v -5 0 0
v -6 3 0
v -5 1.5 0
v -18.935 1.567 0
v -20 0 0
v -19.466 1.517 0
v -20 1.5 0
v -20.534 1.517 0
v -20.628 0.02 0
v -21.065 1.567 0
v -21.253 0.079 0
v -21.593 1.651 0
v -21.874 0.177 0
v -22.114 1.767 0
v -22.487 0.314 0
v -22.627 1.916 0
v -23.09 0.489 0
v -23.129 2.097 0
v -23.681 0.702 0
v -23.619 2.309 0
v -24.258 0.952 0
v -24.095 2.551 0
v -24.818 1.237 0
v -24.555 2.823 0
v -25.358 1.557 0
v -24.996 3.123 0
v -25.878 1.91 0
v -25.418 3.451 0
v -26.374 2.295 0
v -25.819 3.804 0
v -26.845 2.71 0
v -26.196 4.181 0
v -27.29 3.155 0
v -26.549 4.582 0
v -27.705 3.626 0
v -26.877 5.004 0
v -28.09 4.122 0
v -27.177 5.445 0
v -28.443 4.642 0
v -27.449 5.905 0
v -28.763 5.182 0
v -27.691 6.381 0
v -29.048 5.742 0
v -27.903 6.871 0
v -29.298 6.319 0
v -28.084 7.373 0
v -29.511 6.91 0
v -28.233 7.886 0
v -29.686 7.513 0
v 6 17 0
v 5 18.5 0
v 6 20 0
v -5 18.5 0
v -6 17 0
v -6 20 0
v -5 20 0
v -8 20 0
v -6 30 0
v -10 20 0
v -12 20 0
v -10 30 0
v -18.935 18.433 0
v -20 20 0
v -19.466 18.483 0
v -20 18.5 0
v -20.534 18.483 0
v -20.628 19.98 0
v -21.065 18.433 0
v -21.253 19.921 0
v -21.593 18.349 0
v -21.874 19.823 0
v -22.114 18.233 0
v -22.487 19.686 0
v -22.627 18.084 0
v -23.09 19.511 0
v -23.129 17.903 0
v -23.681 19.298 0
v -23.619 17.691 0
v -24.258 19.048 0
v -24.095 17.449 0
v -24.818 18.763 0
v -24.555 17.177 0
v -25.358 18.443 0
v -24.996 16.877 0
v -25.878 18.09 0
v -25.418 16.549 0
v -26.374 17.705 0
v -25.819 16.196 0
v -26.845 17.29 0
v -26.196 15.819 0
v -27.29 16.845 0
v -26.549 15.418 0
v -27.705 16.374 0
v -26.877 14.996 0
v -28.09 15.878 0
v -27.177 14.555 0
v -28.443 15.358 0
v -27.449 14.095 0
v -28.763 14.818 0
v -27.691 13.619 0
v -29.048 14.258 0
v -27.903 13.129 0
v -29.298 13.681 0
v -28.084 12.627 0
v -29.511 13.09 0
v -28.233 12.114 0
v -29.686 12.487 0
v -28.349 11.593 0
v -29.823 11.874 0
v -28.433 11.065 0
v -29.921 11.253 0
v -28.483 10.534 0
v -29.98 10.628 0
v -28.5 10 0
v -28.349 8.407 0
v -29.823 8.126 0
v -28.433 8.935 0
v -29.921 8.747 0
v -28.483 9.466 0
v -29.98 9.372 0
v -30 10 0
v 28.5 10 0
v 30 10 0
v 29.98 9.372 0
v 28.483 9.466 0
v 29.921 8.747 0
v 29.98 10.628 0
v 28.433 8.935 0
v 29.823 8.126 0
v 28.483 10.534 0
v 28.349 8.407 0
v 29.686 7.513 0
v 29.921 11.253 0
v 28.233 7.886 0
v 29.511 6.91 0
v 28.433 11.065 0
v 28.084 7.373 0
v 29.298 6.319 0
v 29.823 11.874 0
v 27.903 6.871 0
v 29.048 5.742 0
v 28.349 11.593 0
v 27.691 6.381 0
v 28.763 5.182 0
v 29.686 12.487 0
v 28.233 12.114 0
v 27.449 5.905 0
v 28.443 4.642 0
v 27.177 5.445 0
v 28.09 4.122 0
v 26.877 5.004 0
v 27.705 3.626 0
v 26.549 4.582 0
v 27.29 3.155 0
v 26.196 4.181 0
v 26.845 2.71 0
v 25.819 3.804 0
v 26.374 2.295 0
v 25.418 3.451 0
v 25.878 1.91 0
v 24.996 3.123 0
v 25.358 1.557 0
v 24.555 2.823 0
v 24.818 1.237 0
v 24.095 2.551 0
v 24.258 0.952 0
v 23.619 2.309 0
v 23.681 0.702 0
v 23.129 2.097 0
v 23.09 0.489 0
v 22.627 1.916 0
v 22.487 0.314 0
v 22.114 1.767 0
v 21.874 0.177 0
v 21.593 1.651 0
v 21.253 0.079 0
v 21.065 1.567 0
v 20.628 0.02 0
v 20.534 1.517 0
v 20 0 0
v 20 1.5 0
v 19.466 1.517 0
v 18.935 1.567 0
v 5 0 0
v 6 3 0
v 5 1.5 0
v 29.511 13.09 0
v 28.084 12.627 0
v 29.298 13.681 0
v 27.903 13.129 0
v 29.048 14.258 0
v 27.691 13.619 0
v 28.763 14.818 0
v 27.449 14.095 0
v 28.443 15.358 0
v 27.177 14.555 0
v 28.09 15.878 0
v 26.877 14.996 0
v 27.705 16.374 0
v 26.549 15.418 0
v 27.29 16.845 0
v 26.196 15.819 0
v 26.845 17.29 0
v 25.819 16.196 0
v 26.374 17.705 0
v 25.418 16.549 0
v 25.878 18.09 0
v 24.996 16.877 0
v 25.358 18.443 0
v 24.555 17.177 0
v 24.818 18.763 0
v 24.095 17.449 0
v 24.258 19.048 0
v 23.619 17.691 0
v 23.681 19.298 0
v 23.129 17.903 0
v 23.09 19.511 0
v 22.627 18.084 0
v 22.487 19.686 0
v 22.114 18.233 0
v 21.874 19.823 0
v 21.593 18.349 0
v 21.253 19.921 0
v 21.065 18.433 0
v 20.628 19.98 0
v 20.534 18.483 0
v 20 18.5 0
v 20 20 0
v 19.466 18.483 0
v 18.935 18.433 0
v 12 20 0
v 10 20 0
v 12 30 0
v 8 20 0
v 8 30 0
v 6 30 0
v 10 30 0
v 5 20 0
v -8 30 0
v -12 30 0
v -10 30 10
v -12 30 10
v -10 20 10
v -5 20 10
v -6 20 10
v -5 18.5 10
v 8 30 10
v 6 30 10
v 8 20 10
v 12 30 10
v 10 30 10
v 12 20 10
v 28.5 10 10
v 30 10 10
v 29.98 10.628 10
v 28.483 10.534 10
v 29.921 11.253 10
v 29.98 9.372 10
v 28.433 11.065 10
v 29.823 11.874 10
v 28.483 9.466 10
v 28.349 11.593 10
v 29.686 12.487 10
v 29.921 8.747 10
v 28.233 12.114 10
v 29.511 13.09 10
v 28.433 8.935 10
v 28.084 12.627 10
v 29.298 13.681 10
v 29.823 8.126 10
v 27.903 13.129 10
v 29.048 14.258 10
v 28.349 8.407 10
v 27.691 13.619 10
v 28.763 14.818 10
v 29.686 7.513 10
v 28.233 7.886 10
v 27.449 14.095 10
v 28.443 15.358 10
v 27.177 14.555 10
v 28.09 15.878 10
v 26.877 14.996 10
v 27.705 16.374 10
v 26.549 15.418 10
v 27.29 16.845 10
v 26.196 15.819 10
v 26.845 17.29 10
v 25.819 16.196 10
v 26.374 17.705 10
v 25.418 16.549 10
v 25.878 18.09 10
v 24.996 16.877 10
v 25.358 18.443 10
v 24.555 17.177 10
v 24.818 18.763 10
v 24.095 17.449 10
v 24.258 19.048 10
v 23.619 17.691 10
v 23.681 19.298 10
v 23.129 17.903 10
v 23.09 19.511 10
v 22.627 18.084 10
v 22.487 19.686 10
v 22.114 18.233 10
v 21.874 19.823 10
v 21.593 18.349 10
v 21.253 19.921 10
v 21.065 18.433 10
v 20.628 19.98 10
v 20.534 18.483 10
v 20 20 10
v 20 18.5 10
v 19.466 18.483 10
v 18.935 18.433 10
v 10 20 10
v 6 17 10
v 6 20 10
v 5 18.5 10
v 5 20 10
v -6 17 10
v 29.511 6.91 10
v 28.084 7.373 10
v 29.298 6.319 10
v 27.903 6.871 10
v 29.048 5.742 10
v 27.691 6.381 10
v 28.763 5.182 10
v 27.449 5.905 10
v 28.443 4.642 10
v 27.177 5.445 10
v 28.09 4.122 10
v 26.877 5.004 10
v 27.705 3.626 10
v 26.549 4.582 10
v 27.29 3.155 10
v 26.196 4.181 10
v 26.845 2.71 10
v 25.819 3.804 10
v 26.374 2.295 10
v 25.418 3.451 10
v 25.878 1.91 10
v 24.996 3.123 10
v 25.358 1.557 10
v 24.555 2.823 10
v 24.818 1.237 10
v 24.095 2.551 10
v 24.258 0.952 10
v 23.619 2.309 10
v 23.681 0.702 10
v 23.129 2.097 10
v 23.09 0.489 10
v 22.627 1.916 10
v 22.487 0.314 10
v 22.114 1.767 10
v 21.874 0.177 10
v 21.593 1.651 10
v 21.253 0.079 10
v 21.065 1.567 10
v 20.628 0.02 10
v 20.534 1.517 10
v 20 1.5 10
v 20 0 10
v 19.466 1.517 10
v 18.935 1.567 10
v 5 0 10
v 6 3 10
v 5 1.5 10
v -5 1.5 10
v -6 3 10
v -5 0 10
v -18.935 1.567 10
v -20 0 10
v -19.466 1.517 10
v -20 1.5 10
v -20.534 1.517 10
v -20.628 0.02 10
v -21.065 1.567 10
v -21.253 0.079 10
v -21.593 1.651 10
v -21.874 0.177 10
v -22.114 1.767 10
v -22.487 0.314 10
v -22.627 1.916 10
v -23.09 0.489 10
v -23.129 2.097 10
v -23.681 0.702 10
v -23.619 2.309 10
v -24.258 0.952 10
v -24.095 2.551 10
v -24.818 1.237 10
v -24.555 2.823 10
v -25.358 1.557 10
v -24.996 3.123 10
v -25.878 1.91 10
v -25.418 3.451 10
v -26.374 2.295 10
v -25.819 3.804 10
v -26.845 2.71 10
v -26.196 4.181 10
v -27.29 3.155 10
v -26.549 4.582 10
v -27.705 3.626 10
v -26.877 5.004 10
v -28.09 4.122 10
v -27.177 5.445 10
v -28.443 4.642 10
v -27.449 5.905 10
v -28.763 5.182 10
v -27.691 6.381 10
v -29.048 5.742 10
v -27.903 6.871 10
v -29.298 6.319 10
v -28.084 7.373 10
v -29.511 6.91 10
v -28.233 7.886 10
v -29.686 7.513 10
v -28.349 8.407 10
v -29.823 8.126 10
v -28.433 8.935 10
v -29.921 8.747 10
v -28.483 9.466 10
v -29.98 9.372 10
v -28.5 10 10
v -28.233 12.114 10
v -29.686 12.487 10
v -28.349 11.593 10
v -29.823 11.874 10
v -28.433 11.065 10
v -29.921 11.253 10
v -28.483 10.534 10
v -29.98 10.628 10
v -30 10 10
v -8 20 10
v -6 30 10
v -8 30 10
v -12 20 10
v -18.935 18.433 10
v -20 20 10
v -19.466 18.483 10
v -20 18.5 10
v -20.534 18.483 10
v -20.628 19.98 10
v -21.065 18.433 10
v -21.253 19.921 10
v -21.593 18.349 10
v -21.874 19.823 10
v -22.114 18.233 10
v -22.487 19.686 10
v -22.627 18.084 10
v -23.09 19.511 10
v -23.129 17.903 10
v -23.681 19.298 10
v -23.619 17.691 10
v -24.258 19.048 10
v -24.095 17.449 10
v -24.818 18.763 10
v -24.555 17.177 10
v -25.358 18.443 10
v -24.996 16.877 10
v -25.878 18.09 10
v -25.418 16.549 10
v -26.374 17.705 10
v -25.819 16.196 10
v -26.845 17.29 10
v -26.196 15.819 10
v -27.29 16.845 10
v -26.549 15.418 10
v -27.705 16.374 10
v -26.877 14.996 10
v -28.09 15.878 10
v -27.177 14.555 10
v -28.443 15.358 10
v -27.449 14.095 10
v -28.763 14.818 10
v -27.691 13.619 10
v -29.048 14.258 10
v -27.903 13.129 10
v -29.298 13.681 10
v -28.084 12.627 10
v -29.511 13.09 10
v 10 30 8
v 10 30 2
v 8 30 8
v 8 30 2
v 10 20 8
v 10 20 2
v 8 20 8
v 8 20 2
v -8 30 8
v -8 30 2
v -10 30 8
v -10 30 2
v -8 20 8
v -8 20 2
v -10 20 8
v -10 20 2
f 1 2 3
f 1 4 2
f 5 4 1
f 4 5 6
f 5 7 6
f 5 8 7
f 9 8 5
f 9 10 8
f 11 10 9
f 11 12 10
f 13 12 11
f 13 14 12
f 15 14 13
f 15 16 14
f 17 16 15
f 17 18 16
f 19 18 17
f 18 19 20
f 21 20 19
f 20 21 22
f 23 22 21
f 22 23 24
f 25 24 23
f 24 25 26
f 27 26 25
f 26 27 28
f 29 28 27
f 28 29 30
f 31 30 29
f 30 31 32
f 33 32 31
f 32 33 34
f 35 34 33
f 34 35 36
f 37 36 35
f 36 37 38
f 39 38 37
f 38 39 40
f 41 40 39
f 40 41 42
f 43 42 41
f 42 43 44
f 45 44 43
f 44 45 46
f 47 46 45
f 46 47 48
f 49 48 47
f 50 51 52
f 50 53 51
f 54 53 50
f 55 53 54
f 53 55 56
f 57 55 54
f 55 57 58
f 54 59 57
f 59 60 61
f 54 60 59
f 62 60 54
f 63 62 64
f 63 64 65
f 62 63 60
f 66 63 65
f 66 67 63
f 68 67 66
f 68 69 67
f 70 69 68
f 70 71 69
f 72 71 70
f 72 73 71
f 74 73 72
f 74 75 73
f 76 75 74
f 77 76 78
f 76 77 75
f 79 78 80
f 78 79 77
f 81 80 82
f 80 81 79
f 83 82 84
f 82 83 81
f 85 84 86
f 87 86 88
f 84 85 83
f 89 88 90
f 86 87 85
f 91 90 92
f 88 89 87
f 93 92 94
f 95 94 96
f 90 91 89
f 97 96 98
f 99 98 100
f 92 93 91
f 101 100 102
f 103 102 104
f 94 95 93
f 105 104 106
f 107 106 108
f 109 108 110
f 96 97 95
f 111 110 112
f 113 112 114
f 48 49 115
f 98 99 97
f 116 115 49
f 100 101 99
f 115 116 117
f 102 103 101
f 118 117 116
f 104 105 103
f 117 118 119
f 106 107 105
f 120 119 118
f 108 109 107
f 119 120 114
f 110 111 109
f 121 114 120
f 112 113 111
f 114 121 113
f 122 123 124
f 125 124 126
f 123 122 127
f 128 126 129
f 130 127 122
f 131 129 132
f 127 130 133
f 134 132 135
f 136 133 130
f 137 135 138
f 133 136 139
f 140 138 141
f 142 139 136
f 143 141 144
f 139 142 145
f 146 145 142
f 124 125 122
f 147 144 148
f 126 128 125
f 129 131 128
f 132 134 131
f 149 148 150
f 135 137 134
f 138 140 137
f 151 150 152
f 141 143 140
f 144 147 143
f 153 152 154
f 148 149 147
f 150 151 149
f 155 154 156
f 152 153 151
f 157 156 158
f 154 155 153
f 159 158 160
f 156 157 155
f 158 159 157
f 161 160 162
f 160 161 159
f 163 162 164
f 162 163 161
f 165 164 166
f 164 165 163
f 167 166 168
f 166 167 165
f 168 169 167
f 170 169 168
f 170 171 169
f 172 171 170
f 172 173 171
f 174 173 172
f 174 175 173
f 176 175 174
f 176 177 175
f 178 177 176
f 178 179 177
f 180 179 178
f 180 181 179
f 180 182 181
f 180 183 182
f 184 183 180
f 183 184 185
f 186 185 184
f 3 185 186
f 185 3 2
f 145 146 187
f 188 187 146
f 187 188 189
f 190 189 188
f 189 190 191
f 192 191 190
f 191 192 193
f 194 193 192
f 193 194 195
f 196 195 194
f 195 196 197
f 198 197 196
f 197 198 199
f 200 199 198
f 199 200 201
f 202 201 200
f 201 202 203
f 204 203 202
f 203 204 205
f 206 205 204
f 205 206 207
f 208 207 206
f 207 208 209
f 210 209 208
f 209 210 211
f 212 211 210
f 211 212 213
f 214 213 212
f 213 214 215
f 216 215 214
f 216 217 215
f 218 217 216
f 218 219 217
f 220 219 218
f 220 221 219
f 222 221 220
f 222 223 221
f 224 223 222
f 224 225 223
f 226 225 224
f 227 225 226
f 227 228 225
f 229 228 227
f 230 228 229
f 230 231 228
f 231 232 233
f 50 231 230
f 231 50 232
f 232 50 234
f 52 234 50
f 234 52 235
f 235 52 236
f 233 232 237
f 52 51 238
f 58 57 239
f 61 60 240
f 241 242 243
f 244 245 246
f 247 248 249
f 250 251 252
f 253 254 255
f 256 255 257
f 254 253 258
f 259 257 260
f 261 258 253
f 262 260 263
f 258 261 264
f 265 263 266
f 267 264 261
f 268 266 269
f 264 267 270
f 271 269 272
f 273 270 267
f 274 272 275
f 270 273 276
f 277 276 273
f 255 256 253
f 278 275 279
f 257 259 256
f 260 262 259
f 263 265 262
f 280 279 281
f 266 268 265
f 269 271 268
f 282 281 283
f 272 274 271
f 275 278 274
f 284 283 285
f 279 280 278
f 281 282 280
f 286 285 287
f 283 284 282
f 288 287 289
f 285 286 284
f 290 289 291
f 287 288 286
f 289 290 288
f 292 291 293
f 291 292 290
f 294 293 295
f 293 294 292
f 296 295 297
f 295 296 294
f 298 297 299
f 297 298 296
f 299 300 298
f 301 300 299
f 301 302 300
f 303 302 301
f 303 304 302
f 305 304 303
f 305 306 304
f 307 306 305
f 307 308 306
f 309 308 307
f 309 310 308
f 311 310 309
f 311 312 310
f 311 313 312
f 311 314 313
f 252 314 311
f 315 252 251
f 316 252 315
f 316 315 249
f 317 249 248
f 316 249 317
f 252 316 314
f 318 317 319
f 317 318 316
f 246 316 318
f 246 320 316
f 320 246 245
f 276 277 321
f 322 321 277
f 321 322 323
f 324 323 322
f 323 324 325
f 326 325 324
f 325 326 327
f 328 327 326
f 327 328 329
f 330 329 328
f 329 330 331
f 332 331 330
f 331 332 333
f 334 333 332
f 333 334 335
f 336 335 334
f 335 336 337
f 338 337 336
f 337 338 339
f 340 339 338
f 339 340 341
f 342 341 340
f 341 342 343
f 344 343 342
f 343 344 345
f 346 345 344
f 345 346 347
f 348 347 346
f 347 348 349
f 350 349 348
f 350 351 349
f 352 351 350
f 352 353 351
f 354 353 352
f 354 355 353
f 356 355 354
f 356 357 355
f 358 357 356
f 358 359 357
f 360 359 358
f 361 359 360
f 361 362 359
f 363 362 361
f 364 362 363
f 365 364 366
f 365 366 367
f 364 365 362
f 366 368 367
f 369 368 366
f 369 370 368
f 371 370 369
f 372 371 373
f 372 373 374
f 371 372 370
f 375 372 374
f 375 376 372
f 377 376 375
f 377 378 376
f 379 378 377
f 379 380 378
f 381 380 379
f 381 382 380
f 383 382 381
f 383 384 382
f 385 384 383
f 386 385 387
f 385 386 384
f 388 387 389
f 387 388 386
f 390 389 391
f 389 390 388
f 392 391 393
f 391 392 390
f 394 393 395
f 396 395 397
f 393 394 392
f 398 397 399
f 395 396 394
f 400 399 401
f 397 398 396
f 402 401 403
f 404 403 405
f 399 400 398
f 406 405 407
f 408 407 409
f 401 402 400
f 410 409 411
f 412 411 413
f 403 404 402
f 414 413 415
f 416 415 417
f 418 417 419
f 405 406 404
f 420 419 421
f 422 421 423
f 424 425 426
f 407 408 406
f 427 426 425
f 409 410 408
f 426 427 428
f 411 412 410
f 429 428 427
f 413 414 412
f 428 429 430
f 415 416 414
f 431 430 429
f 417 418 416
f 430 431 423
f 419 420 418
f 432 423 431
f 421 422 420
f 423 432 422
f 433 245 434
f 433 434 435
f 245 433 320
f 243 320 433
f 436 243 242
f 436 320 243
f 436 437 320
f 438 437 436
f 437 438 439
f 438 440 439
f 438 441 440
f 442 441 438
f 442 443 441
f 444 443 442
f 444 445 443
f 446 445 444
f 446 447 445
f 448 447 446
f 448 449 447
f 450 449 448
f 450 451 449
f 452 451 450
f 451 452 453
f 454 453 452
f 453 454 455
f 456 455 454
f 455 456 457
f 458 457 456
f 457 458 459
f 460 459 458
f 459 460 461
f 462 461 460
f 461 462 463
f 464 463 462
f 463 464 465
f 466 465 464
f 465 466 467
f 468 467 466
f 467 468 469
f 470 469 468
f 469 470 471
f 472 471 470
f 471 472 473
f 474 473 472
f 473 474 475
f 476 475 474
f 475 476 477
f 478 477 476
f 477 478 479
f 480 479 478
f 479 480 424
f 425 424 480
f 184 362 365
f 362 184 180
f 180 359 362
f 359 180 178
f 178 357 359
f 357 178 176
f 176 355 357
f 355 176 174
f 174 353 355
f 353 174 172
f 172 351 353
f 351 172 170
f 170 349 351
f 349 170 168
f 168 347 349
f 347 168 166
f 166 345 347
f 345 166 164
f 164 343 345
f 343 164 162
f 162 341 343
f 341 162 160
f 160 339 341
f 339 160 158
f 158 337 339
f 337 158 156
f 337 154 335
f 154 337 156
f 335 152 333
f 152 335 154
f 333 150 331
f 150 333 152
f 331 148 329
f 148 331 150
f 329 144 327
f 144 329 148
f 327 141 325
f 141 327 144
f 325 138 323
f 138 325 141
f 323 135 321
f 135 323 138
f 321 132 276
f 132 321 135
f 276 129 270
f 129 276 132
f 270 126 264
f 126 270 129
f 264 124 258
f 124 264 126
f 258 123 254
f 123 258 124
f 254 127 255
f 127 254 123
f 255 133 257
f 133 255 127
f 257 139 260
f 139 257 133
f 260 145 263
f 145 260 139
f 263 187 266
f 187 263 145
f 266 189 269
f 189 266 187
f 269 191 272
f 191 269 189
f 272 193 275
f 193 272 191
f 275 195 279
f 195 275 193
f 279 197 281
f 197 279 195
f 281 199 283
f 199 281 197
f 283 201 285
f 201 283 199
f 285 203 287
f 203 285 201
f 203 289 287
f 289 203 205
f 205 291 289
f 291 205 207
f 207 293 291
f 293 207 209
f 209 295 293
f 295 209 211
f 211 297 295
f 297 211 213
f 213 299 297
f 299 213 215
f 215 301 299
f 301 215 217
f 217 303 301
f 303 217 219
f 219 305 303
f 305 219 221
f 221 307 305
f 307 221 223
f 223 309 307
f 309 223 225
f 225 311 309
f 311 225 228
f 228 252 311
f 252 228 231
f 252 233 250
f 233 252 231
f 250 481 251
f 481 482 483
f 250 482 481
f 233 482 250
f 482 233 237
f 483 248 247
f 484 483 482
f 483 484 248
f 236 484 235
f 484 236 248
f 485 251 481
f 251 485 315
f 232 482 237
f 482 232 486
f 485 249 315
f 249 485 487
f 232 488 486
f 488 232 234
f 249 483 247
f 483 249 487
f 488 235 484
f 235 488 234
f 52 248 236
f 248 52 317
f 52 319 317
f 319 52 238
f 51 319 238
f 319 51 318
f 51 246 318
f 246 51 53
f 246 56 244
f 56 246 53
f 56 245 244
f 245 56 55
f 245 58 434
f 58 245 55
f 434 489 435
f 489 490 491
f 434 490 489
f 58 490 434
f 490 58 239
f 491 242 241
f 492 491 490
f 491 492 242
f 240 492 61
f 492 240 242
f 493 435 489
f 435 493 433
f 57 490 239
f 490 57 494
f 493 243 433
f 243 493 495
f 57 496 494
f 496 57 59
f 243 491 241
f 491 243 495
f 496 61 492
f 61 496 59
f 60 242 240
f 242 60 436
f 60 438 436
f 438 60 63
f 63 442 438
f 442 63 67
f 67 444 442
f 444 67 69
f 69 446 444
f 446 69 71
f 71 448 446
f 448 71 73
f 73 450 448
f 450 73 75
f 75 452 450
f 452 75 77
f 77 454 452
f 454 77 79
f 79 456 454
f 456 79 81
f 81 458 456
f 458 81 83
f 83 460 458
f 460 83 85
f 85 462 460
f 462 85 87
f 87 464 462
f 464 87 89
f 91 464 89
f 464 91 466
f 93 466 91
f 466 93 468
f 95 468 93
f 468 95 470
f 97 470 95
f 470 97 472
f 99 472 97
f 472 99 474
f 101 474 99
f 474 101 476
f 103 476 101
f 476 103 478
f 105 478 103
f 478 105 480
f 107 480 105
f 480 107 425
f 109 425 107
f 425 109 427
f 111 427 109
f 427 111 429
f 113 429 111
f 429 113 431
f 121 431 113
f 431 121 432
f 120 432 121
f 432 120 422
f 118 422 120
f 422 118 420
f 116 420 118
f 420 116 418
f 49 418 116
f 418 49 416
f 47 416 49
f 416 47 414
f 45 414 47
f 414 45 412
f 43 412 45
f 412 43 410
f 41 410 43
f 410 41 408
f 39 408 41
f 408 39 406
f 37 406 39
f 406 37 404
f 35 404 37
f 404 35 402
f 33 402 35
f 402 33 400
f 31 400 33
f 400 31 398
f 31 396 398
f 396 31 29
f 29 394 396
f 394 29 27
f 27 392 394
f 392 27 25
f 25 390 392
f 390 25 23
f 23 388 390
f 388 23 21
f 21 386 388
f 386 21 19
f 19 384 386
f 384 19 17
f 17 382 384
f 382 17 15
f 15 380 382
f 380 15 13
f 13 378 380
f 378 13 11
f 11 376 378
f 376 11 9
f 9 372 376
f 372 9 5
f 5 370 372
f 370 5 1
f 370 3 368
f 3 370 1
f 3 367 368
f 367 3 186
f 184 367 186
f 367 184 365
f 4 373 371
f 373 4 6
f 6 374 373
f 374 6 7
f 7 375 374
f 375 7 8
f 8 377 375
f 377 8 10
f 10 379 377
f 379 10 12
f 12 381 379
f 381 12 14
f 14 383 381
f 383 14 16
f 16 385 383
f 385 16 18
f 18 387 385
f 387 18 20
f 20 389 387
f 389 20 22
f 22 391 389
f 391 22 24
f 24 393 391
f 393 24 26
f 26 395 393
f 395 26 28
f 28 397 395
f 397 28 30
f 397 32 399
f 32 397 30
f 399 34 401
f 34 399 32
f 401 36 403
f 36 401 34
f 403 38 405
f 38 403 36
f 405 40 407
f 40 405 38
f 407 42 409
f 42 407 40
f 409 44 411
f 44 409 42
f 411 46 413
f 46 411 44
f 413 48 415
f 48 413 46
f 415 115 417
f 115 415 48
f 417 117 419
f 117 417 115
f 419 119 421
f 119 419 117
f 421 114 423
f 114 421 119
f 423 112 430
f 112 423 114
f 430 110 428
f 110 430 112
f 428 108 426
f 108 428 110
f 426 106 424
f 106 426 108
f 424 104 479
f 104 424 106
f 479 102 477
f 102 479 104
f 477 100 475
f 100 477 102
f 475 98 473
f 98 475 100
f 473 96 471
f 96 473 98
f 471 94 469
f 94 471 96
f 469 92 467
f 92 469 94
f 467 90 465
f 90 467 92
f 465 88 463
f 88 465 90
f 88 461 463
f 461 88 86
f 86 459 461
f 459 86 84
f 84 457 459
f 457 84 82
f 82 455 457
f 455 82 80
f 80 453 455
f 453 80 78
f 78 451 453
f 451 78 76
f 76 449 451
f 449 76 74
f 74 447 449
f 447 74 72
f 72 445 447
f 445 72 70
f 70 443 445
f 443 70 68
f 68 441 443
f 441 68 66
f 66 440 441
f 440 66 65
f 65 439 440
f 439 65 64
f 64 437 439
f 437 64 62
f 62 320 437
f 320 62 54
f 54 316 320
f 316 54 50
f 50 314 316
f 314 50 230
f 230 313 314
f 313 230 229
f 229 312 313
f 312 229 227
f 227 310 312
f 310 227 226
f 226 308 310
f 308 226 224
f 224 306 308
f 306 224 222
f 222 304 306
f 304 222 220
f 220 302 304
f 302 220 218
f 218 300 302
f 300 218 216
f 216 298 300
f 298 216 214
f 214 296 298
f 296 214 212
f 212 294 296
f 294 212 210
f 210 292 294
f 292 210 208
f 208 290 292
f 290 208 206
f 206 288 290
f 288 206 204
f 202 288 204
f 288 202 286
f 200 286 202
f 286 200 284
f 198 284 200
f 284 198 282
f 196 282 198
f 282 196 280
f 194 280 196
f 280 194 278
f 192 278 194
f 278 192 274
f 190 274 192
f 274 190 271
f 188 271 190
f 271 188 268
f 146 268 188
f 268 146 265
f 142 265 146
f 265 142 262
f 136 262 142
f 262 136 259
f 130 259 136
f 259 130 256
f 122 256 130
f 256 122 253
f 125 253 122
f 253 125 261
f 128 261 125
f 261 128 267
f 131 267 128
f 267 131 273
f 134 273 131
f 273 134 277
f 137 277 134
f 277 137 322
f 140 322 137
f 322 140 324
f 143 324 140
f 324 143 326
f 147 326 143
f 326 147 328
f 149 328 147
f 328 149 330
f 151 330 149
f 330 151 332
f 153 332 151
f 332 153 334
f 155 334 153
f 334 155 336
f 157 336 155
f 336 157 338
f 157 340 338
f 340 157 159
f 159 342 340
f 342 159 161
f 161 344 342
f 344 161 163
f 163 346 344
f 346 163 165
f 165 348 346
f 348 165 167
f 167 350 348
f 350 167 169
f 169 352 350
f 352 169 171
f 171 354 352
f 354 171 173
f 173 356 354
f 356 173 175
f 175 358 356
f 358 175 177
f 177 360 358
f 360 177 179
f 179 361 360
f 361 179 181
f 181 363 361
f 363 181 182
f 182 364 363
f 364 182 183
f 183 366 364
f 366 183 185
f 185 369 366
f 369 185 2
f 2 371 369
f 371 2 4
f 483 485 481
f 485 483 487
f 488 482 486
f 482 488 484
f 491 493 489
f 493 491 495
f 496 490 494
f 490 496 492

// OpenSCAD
$fn=100;

damper(part="a");

module damper(d=20, height=10, thickness=1.5, part="b") {
    linear_extrude(height=height) {
        half();
        mirror([1, 0]) half();
    }
    translate([10-2, d, (10-6)/2]) cube([2, 10, 6]);
    mirror([1, 0, 0]) translate([10-2, d, (10-6)/2]) cube([2, 10, 6]);
    
    module half() difference() {
        union() {
            square([d, d]);
            translate([d, d/2]) circle(d=d);
            translate([10, d]) square([2, 10]);
            translate([10-2-2, d]) square([2, 10]);
        }
       translate([0, thickness*2]) square([d, d-thickness*4]);
       hull() {
           translate([height/2+1, thickness*2]) square([1, d-thickness*4]);
           translate([d, d/2]) circle(d=d-thickness*2);
       }
        
        if(part=="a") {
            square([height/2, thickness]);
            translate([0, d-thickness]) square([5, thickness]);
        } else {
            translate([0, thickness]) square([height/2, thickness]);
            translate([0, d-thickness*2]) square([5, thickness]);
        }
    }
}

/*
module half() {
    square([10, 7]);
    hull() {
        translate([10, 0]) square([10, 7]);
        translate([10+5/2, 20-5/2]) circle(d=5);
        translate([10+10-5/2, 5]) circle(d=5);
    }
}
*/

// Copyright (c) 2013 Oskar Linde. All rights reserved.
// License: BSD
//
// This library contains basic 2D morphology operations
//
// outset(d=1)            - creates a polygon at an offset d outside a 2D shape
// inset(d=1)             - creates a polygon at an offset d inside a 2D shape
// fillet(r=1)            - adds fillets of radius r to all concave corners of a 2D shape
// rounding(r=1)          - adds rounding to all convex corners of a 2D shape
// shell(d,center=false)  - makes a shell of width d along the edge of a 2D shape
//                        - positive values of d places the shell on the outside
//                        - negative values of d places the shell on the inside
//                        - center=true and positive d places the shell centered on the edge

module outset(d=1) {
	// Bug workaround for older OpenSCAD versions
	if (version_num() < 20130424) render() outset_extruded(d) children();
	else minkowski() {
		circle(r=d);
		children();
	}
}

module outset_extruded(d=1) {
   projection(cut=true) minkowski() {
        cylinder(r=d);
        linear_extrude(center=true) children();
   }
}

module inset(d=1) {
	 render() inverse() outset(d=d) inverse() children();
}

module fillet(r=1) {
	inset(d=r) render() outset(d=r) children();
}

module rounding(r=1) {
	outset(d=r) inset(d=r) children();
}

module shell(d,center=false) {
	if (center && d > 0) {
		difference() {
			outset(d=d/2) children();
			inset(d=d/2) children();
		}
	}
	if (!center && d > 0) {
		difference() {
			outset(d=d) children();
			children();
		}
	}
	if (!center && d < 0) {
		difference() {
			children();
			inset(d=-d) children();
		}
	}
	if (d == 0) children();
}


// Below are for internal use only

module inverse() {
	difference() {
		square(1e5,center=true);
		children();
	}
}
